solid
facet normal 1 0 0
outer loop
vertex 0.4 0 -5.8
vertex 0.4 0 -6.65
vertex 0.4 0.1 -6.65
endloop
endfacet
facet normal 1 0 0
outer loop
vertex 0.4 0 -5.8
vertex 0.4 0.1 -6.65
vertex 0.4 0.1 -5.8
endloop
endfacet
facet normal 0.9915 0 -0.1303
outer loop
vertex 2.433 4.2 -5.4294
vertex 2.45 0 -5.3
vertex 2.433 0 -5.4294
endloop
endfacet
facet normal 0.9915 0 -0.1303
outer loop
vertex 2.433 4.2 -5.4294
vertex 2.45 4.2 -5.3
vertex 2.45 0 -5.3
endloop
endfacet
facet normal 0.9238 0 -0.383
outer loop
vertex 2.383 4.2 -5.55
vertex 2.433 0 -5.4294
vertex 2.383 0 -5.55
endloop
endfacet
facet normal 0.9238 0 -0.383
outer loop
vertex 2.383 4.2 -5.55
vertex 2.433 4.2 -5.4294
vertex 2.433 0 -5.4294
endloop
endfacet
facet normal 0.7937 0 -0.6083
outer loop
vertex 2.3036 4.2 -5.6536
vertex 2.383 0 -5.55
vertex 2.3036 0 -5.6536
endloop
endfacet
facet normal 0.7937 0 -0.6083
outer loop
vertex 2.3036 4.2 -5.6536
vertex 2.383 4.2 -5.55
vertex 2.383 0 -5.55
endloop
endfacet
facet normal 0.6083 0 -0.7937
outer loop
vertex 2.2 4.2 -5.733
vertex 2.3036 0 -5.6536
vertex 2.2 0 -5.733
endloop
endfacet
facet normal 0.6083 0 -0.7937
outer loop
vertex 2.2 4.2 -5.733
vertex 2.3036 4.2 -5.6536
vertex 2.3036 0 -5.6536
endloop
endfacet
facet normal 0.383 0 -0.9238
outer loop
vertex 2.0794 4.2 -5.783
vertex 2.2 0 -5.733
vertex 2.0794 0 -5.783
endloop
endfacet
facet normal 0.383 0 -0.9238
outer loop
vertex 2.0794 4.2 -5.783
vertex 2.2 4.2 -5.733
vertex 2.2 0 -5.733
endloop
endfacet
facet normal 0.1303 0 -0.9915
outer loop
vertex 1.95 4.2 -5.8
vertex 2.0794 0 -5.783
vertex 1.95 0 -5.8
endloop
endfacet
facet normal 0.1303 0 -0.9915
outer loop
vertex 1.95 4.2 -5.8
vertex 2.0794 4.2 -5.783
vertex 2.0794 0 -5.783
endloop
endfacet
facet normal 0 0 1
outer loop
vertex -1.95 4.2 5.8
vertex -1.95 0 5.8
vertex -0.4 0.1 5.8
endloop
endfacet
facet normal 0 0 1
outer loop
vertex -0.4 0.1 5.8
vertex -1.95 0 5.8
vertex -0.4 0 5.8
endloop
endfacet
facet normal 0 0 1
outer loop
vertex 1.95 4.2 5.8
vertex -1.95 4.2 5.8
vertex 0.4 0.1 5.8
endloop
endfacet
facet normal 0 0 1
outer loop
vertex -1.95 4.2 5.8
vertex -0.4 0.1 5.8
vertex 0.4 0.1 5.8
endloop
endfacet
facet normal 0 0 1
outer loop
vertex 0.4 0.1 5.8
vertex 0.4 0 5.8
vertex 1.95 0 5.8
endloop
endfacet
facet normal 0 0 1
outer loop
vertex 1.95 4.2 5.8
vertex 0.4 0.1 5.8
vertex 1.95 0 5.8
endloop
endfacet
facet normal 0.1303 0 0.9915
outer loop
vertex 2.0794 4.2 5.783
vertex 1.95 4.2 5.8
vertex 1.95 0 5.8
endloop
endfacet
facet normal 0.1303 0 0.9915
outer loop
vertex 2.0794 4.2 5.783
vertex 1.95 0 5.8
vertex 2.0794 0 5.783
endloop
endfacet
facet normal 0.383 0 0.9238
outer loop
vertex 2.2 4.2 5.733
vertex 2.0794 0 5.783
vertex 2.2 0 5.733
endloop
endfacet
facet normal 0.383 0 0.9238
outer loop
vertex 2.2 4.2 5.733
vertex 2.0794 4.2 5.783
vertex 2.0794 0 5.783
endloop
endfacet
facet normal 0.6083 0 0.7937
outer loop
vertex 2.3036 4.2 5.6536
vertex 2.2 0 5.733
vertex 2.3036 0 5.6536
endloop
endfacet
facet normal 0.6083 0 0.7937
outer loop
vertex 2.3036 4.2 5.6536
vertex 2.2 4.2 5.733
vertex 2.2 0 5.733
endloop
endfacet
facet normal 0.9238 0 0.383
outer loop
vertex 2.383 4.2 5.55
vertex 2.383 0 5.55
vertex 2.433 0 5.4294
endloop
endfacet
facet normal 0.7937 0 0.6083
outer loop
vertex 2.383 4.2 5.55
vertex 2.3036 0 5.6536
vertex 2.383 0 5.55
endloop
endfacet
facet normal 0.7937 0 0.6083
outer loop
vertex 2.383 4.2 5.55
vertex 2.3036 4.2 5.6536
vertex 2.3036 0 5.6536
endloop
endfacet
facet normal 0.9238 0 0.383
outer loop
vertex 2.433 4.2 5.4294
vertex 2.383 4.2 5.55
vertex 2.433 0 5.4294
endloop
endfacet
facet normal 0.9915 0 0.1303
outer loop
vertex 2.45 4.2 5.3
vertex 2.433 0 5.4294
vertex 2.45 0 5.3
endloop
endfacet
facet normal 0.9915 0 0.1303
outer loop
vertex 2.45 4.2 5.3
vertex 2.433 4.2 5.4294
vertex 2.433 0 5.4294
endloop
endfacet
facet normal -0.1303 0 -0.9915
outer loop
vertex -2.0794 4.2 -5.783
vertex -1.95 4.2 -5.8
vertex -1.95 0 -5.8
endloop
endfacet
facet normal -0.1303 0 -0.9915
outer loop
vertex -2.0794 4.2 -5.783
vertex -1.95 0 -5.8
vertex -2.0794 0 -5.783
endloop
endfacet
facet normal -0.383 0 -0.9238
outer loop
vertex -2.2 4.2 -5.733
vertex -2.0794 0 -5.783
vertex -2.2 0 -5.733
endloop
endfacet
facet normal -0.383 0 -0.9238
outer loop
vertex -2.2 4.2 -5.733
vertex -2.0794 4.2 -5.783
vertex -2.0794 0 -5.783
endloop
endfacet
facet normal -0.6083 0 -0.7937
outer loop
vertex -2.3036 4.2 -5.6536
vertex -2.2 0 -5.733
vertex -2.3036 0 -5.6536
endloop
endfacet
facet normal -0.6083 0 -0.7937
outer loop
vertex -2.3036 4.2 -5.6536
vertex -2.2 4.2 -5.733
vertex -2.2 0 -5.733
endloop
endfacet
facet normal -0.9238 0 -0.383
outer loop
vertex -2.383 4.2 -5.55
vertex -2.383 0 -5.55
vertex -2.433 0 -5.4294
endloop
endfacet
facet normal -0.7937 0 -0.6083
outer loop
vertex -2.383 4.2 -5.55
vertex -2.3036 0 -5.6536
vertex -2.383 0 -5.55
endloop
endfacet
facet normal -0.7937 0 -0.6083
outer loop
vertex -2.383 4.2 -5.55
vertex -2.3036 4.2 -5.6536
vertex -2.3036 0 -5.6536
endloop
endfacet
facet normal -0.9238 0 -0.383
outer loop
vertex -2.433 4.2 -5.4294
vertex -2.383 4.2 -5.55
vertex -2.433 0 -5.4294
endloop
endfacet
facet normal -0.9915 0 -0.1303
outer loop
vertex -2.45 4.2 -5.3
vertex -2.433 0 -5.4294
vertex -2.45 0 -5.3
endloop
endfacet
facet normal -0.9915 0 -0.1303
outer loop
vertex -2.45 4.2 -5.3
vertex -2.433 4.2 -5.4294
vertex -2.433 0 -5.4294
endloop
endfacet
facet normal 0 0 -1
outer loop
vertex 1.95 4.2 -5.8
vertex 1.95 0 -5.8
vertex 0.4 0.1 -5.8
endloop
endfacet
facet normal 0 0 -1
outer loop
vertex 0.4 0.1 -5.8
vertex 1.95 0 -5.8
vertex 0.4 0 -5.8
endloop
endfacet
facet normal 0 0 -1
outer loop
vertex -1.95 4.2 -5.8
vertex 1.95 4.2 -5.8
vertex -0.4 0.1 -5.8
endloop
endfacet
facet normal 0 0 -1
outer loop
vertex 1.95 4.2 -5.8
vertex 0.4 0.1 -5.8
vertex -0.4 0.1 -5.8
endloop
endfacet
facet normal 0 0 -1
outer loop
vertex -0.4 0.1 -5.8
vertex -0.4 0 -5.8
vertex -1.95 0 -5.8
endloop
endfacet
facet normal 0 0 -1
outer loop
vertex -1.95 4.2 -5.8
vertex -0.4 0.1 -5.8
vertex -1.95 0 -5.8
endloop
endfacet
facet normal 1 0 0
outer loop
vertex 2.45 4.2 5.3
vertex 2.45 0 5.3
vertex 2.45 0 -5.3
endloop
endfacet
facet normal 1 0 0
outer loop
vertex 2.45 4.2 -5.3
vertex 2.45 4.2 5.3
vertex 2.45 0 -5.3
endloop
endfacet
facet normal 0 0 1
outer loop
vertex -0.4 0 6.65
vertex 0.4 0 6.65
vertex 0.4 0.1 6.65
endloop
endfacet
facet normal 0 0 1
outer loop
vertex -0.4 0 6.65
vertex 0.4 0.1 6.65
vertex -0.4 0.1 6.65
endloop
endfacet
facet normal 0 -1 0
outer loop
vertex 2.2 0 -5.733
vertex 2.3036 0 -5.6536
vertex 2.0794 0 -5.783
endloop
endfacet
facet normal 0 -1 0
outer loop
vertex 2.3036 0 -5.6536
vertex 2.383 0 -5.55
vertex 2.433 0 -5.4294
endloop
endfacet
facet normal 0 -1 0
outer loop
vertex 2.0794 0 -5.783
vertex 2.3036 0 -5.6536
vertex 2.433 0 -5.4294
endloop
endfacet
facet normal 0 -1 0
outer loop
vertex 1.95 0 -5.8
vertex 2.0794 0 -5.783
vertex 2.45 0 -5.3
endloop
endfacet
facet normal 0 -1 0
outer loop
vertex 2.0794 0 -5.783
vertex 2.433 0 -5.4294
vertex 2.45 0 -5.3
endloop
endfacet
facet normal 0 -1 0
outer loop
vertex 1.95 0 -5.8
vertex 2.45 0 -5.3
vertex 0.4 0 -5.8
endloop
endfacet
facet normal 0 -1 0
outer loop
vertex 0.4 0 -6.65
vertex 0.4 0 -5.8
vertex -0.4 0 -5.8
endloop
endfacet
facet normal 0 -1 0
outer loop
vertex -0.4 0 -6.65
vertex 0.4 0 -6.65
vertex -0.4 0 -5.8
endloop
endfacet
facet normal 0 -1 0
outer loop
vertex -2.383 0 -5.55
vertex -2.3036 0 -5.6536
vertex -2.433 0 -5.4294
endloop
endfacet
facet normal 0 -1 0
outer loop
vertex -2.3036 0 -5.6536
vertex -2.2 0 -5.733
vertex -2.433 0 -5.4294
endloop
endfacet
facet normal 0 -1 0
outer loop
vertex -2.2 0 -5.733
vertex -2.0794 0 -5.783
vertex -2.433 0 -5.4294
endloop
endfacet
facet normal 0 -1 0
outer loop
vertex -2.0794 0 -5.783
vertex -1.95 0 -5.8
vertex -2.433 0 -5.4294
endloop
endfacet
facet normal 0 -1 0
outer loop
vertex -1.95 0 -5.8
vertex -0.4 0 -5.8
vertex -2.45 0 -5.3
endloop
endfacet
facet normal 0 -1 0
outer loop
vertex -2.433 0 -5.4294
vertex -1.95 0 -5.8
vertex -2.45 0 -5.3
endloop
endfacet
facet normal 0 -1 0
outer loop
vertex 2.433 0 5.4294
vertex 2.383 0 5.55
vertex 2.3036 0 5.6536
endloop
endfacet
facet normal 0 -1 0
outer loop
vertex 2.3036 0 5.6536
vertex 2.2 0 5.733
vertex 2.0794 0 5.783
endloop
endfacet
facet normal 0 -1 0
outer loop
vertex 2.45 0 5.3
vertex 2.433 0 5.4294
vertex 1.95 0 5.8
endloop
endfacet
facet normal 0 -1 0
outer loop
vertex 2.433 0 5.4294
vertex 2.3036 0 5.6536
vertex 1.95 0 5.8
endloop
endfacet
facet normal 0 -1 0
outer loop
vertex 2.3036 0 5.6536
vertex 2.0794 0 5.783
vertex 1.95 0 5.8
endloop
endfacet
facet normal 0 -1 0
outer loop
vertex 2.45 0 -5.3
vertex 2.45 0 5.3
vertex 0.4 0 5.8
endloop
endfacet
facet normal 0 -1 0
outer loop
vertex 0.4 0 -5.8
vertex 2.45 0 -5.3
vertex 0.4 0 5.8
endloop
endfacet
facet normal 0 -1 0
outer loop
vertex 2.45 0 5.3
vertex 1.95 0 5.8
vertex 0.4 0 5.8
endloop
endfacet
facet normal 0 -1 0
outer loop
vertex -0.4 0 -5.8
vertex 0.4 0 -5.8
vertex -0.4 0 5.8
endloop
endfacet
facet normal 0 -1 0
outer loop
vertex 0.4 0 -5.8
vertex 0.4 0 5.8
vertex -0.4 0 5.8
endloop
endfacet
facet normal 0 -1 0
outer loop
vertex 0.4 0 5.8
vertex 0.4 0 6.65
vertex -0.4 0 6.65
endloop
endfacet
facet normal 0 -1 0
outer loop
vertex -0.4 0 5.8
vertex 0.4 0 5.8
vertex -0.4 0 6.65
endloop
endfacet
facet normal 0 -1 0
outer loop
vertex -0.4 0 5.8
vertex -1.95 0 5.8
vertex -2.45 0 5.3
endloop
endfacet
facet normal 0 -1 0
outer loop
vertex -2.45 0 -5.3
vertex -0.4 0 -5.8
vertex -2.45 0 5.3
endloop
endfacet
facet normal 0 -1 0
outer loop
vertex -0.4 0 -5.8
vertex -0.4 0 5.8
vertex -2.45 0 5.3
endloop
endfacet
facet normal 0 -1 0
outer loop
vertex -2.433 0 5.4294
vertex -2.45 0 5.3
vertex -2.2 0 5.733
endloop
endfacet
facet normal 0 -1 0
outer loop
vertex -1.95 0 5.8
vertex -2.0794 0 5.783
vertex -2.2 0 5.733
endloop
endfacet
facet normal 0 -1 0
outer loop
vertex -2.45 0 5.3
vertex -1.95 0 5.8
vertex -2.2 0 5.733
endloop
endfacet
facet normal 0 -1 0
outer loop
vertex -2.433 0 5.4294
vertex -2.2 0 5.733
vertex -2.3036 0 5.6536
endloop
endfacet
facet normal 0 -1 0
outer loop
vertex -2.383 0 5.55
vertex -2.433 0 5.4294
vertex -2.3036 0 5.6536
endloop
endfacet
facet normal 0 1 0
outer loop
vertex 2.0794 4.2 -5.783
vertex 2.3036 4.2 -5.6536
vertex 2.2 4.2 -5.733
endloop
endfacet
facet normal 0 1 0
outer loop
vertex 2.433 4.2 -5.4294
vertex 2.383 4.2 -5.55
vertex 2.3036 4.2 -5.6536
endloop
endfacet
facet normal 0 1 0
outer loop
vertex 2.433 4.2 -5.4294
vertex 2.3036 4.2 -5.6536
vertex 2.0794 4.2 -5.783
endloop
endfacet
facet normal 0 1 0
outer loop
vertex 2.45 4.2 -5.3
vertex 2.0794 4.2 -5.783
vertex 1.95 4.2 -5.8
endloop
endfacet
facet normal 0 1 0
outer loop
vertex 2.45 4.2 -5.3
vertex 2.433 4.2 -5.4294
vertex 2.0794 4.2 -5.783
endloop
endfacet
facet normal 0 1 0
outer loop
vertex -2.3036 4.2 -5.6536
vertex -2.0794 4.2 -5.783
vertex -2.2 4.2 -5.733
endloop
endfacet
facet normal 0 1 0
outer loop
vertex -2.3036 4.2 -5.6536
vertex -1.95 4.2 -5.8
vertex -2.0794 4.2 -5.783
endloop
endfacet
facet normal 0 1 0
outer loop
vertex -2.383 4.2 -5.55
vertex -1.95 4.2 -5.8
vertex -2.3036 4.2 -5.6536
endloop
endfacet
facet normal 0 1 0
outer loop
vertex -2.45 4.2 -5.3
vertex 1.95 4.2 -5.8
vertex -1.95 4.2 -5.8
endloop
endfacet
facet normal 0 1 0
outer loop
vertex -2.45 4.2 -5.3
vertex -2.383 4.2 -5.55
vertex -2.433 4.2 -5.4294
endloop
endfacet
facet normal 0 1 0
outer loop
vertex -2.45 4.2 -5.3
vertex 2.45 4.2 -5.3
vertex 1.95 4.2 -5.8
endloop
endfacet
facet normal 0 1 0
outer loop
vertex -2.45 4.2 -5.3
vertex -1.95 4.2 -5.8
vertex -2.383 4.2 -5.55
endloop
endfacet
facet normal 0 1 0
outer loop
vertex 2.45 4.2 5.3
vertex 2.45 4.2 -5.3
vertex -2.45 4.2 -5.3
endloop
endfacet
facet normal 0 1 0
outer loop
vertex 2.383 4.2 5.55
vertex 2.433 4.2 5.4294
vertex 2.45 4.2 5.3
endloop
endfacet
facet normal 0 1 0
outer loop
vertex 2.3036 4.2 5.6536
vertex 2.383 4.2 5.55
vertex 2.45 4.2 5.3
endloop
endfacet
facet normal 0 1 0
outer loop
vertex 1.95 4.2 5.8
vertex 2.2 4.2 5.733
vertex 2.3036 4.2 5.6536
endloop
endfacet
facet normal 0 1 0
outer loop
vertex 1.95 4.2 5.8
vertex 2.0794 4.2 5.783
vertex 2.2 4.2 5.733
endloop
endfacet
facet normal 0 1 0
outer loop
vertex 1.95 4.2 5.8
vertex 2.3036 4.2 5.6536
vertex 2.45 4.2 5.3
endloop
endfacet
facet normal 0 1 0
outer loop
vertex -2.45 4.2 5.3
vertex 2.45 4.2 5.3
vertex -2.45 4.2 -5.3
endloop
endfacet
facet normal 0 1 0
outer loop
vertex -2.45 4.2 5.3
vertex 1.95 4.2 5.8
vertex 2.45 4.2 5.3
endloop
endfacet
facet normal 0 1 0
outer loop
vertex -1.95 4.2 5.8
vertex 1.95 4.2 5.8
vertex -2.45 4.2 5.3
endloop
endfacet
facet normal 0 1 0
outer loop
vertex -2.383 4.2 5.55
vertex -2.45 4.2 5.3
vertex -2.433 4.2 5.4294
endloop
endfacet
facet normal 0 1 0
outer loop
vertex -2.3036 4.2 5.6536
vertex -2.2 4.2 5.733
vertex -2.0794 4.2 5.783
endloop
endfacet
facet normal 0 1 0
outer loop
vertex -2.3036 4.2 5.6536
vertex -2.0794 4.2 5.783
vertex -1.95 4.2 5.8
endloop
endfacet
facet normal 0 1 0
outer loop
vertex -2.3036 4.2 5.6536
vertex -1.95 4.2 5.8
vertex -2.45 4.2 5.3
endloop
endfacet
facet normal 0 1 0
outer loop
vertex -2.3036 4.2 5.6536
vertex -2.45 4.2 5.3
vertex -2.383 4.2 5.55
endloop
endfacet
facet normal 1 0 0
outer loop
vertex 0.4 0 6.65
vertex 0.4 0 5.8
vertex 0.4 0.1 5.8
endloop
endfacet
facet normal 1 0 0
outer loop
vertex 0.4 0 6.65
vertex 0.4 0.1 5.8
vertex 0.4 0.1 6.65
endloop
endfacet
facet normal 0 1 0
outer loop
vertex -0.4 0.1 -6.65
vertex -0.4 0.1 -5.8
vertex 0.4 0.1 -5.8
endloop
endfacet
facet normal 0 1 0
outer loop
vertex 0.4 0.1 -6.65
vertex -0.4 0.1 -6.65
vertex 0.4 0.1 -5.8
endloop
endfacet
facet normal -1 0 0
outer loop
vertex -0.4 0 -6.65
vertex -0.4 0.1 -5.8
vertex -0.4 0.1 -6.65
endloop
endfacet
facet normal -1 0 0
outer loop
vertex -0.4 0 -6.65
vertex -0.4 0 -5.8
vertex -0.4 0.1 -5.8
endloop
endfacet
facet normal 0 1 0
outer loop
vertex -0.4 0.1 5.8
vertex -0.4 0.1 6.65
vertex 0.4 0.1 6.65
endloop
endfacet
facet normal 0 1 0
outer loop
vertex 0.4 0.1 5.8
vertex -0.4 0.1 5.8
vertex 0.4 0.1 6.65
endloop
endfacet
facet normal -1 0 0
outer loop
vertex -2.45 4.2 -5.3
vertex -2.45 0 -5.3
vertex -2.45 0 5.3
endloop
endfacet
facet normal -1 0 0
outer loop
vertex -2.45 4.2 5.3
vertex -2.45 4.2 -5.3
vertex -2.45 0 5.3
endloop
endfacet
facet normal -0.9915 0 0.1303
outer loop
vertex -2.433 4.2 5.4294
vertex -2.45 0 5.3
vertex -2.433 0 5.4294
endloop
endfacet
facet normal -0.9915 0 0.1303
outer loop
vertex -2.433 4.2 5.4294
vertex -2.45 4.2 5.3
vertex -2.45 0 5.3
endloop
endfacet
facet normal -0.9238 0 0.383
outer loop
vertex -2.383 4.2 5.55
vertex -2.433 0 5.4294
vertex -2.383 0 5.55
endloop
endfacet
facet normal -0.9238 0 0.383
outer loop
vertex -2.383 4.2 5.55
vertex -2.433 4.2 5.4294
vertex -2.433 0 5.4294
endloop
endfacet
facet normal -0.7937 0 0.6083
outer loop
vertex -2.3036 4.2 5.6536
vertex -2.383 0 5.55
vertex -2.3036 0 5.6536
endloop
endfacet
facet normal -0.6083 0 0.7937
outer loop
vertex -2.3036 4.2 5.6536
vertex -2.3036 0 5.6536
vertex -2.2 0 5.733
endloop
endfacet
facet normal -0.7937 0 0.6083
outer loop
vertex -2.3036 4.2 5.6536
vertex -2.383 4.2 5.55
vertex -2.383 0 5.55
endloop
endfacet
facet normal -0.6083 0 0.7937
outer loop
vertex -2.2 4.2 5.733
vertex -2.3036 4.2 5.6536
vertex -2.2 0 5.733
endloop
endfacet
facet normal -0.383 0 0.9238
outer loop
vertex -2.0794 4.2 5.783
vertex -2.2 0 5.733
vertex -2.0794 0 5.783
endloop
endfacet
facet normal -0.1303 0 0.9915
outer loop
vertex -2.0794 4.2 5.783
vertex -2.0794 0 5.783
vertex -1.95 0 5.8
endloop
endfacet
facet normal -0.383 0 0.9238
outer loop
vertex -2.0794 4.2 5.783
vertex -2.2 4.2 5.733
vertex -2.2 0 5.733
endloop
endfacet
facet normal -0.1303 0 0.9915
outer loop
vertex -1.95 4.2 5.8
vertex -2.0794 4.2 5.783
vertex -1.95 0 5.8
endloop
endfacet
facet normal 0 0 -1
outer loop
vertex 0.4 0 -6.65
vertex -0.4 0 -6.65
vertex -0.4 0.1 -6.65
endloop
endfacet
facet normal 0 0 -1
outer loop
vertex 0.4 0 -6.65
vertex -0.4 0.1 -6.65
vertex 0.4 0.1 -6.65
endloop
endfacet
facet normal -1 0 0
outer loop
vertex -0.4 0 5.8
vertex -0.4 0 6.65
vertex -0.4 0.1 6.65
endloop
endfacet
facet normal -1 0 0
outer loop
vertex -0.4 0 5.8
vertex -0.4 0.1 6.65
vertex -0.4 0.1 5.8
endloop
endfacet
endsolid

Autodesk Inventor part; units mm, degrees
ref_plane "YZ Plane" through (0, 0, 0) normal (1, 0, 0) x (0, 1, 0)
ref_plane "XZ Plane" through (0, 0, 0) normal (0, 1, 0) x (-1, 0, 0)
ref_plane "XY Plane" through (0, 0, 0) normal (0, 0, 1) x (1, 0, 0)
sketch "Sketch1" plane through (0, 0, 0) normal (0, 1, 0) x (-1, 0, 0)
  line L0 (2.45, 5.8) -> (-2.45, 5.8)
  line L1 (-2.45, 5.8) -> (-2.45, -5.8)
  line L2 (-2.45, -5.8) -> (2.45, -5.8)
  line L3 (2.45, -5.8) -> (2.45, 5.8)
  point P0 (0, 0)
  dimension "d0" = 11.6
  dimension "d1" = 5.8
  dimension "d2" = 4.9
  dimension "d3" = 2.45
extrude "Extrusion1" add sketch "Sketch1" along normal blind 4.2
fillet "Fillet1" radius 0.5 4 edges at (2.45, 2.1, 5.8) (-2.45, 2.1, 5.8) (2.45, 2.1, -5.8) (-2.45, 2.1, -5.8)
sketch "Sketch2" plane through (0, 0, 0) normal (0, -1, 0) x (1, 0, 0)
  line L0 (0.4, 6.65) -> (-0.4, 6.65)
  line L1 (-0.4, 6.65) -> (-0.4, 2.4)
  line L2 (-0.4, 2.4) -> (0.4, 2.4)
  line L3 (0.4, 2.4) -> (0.4, 6.65)
  line L4 (0.4, -2.4) -> (-0.4, -2.4)
  line L5 (-0.4, -2.4) -> (-0.4, -6.65)
  line L6 (-0.4, -6.65) -> (0.4, -6.65)
  line L7 (0.4, -6.65) -> (0.4, -2.4)
  point P0 (0, 0)
  dimension "d7" = 13.3
  dimension "d9" = 4.8
  dimension "d10" = 2.4
  dimension "d11" = 6.65
  dimension "d12" = 0.8
  dimension "d13" = 0.8
  dimension "d14" = 0.4
  dimension "d15" = 0.4
extrude "Extrusion2" add sketch "Sketch2" against normal blind 0.1
properties part number "HC49_XTAL"
